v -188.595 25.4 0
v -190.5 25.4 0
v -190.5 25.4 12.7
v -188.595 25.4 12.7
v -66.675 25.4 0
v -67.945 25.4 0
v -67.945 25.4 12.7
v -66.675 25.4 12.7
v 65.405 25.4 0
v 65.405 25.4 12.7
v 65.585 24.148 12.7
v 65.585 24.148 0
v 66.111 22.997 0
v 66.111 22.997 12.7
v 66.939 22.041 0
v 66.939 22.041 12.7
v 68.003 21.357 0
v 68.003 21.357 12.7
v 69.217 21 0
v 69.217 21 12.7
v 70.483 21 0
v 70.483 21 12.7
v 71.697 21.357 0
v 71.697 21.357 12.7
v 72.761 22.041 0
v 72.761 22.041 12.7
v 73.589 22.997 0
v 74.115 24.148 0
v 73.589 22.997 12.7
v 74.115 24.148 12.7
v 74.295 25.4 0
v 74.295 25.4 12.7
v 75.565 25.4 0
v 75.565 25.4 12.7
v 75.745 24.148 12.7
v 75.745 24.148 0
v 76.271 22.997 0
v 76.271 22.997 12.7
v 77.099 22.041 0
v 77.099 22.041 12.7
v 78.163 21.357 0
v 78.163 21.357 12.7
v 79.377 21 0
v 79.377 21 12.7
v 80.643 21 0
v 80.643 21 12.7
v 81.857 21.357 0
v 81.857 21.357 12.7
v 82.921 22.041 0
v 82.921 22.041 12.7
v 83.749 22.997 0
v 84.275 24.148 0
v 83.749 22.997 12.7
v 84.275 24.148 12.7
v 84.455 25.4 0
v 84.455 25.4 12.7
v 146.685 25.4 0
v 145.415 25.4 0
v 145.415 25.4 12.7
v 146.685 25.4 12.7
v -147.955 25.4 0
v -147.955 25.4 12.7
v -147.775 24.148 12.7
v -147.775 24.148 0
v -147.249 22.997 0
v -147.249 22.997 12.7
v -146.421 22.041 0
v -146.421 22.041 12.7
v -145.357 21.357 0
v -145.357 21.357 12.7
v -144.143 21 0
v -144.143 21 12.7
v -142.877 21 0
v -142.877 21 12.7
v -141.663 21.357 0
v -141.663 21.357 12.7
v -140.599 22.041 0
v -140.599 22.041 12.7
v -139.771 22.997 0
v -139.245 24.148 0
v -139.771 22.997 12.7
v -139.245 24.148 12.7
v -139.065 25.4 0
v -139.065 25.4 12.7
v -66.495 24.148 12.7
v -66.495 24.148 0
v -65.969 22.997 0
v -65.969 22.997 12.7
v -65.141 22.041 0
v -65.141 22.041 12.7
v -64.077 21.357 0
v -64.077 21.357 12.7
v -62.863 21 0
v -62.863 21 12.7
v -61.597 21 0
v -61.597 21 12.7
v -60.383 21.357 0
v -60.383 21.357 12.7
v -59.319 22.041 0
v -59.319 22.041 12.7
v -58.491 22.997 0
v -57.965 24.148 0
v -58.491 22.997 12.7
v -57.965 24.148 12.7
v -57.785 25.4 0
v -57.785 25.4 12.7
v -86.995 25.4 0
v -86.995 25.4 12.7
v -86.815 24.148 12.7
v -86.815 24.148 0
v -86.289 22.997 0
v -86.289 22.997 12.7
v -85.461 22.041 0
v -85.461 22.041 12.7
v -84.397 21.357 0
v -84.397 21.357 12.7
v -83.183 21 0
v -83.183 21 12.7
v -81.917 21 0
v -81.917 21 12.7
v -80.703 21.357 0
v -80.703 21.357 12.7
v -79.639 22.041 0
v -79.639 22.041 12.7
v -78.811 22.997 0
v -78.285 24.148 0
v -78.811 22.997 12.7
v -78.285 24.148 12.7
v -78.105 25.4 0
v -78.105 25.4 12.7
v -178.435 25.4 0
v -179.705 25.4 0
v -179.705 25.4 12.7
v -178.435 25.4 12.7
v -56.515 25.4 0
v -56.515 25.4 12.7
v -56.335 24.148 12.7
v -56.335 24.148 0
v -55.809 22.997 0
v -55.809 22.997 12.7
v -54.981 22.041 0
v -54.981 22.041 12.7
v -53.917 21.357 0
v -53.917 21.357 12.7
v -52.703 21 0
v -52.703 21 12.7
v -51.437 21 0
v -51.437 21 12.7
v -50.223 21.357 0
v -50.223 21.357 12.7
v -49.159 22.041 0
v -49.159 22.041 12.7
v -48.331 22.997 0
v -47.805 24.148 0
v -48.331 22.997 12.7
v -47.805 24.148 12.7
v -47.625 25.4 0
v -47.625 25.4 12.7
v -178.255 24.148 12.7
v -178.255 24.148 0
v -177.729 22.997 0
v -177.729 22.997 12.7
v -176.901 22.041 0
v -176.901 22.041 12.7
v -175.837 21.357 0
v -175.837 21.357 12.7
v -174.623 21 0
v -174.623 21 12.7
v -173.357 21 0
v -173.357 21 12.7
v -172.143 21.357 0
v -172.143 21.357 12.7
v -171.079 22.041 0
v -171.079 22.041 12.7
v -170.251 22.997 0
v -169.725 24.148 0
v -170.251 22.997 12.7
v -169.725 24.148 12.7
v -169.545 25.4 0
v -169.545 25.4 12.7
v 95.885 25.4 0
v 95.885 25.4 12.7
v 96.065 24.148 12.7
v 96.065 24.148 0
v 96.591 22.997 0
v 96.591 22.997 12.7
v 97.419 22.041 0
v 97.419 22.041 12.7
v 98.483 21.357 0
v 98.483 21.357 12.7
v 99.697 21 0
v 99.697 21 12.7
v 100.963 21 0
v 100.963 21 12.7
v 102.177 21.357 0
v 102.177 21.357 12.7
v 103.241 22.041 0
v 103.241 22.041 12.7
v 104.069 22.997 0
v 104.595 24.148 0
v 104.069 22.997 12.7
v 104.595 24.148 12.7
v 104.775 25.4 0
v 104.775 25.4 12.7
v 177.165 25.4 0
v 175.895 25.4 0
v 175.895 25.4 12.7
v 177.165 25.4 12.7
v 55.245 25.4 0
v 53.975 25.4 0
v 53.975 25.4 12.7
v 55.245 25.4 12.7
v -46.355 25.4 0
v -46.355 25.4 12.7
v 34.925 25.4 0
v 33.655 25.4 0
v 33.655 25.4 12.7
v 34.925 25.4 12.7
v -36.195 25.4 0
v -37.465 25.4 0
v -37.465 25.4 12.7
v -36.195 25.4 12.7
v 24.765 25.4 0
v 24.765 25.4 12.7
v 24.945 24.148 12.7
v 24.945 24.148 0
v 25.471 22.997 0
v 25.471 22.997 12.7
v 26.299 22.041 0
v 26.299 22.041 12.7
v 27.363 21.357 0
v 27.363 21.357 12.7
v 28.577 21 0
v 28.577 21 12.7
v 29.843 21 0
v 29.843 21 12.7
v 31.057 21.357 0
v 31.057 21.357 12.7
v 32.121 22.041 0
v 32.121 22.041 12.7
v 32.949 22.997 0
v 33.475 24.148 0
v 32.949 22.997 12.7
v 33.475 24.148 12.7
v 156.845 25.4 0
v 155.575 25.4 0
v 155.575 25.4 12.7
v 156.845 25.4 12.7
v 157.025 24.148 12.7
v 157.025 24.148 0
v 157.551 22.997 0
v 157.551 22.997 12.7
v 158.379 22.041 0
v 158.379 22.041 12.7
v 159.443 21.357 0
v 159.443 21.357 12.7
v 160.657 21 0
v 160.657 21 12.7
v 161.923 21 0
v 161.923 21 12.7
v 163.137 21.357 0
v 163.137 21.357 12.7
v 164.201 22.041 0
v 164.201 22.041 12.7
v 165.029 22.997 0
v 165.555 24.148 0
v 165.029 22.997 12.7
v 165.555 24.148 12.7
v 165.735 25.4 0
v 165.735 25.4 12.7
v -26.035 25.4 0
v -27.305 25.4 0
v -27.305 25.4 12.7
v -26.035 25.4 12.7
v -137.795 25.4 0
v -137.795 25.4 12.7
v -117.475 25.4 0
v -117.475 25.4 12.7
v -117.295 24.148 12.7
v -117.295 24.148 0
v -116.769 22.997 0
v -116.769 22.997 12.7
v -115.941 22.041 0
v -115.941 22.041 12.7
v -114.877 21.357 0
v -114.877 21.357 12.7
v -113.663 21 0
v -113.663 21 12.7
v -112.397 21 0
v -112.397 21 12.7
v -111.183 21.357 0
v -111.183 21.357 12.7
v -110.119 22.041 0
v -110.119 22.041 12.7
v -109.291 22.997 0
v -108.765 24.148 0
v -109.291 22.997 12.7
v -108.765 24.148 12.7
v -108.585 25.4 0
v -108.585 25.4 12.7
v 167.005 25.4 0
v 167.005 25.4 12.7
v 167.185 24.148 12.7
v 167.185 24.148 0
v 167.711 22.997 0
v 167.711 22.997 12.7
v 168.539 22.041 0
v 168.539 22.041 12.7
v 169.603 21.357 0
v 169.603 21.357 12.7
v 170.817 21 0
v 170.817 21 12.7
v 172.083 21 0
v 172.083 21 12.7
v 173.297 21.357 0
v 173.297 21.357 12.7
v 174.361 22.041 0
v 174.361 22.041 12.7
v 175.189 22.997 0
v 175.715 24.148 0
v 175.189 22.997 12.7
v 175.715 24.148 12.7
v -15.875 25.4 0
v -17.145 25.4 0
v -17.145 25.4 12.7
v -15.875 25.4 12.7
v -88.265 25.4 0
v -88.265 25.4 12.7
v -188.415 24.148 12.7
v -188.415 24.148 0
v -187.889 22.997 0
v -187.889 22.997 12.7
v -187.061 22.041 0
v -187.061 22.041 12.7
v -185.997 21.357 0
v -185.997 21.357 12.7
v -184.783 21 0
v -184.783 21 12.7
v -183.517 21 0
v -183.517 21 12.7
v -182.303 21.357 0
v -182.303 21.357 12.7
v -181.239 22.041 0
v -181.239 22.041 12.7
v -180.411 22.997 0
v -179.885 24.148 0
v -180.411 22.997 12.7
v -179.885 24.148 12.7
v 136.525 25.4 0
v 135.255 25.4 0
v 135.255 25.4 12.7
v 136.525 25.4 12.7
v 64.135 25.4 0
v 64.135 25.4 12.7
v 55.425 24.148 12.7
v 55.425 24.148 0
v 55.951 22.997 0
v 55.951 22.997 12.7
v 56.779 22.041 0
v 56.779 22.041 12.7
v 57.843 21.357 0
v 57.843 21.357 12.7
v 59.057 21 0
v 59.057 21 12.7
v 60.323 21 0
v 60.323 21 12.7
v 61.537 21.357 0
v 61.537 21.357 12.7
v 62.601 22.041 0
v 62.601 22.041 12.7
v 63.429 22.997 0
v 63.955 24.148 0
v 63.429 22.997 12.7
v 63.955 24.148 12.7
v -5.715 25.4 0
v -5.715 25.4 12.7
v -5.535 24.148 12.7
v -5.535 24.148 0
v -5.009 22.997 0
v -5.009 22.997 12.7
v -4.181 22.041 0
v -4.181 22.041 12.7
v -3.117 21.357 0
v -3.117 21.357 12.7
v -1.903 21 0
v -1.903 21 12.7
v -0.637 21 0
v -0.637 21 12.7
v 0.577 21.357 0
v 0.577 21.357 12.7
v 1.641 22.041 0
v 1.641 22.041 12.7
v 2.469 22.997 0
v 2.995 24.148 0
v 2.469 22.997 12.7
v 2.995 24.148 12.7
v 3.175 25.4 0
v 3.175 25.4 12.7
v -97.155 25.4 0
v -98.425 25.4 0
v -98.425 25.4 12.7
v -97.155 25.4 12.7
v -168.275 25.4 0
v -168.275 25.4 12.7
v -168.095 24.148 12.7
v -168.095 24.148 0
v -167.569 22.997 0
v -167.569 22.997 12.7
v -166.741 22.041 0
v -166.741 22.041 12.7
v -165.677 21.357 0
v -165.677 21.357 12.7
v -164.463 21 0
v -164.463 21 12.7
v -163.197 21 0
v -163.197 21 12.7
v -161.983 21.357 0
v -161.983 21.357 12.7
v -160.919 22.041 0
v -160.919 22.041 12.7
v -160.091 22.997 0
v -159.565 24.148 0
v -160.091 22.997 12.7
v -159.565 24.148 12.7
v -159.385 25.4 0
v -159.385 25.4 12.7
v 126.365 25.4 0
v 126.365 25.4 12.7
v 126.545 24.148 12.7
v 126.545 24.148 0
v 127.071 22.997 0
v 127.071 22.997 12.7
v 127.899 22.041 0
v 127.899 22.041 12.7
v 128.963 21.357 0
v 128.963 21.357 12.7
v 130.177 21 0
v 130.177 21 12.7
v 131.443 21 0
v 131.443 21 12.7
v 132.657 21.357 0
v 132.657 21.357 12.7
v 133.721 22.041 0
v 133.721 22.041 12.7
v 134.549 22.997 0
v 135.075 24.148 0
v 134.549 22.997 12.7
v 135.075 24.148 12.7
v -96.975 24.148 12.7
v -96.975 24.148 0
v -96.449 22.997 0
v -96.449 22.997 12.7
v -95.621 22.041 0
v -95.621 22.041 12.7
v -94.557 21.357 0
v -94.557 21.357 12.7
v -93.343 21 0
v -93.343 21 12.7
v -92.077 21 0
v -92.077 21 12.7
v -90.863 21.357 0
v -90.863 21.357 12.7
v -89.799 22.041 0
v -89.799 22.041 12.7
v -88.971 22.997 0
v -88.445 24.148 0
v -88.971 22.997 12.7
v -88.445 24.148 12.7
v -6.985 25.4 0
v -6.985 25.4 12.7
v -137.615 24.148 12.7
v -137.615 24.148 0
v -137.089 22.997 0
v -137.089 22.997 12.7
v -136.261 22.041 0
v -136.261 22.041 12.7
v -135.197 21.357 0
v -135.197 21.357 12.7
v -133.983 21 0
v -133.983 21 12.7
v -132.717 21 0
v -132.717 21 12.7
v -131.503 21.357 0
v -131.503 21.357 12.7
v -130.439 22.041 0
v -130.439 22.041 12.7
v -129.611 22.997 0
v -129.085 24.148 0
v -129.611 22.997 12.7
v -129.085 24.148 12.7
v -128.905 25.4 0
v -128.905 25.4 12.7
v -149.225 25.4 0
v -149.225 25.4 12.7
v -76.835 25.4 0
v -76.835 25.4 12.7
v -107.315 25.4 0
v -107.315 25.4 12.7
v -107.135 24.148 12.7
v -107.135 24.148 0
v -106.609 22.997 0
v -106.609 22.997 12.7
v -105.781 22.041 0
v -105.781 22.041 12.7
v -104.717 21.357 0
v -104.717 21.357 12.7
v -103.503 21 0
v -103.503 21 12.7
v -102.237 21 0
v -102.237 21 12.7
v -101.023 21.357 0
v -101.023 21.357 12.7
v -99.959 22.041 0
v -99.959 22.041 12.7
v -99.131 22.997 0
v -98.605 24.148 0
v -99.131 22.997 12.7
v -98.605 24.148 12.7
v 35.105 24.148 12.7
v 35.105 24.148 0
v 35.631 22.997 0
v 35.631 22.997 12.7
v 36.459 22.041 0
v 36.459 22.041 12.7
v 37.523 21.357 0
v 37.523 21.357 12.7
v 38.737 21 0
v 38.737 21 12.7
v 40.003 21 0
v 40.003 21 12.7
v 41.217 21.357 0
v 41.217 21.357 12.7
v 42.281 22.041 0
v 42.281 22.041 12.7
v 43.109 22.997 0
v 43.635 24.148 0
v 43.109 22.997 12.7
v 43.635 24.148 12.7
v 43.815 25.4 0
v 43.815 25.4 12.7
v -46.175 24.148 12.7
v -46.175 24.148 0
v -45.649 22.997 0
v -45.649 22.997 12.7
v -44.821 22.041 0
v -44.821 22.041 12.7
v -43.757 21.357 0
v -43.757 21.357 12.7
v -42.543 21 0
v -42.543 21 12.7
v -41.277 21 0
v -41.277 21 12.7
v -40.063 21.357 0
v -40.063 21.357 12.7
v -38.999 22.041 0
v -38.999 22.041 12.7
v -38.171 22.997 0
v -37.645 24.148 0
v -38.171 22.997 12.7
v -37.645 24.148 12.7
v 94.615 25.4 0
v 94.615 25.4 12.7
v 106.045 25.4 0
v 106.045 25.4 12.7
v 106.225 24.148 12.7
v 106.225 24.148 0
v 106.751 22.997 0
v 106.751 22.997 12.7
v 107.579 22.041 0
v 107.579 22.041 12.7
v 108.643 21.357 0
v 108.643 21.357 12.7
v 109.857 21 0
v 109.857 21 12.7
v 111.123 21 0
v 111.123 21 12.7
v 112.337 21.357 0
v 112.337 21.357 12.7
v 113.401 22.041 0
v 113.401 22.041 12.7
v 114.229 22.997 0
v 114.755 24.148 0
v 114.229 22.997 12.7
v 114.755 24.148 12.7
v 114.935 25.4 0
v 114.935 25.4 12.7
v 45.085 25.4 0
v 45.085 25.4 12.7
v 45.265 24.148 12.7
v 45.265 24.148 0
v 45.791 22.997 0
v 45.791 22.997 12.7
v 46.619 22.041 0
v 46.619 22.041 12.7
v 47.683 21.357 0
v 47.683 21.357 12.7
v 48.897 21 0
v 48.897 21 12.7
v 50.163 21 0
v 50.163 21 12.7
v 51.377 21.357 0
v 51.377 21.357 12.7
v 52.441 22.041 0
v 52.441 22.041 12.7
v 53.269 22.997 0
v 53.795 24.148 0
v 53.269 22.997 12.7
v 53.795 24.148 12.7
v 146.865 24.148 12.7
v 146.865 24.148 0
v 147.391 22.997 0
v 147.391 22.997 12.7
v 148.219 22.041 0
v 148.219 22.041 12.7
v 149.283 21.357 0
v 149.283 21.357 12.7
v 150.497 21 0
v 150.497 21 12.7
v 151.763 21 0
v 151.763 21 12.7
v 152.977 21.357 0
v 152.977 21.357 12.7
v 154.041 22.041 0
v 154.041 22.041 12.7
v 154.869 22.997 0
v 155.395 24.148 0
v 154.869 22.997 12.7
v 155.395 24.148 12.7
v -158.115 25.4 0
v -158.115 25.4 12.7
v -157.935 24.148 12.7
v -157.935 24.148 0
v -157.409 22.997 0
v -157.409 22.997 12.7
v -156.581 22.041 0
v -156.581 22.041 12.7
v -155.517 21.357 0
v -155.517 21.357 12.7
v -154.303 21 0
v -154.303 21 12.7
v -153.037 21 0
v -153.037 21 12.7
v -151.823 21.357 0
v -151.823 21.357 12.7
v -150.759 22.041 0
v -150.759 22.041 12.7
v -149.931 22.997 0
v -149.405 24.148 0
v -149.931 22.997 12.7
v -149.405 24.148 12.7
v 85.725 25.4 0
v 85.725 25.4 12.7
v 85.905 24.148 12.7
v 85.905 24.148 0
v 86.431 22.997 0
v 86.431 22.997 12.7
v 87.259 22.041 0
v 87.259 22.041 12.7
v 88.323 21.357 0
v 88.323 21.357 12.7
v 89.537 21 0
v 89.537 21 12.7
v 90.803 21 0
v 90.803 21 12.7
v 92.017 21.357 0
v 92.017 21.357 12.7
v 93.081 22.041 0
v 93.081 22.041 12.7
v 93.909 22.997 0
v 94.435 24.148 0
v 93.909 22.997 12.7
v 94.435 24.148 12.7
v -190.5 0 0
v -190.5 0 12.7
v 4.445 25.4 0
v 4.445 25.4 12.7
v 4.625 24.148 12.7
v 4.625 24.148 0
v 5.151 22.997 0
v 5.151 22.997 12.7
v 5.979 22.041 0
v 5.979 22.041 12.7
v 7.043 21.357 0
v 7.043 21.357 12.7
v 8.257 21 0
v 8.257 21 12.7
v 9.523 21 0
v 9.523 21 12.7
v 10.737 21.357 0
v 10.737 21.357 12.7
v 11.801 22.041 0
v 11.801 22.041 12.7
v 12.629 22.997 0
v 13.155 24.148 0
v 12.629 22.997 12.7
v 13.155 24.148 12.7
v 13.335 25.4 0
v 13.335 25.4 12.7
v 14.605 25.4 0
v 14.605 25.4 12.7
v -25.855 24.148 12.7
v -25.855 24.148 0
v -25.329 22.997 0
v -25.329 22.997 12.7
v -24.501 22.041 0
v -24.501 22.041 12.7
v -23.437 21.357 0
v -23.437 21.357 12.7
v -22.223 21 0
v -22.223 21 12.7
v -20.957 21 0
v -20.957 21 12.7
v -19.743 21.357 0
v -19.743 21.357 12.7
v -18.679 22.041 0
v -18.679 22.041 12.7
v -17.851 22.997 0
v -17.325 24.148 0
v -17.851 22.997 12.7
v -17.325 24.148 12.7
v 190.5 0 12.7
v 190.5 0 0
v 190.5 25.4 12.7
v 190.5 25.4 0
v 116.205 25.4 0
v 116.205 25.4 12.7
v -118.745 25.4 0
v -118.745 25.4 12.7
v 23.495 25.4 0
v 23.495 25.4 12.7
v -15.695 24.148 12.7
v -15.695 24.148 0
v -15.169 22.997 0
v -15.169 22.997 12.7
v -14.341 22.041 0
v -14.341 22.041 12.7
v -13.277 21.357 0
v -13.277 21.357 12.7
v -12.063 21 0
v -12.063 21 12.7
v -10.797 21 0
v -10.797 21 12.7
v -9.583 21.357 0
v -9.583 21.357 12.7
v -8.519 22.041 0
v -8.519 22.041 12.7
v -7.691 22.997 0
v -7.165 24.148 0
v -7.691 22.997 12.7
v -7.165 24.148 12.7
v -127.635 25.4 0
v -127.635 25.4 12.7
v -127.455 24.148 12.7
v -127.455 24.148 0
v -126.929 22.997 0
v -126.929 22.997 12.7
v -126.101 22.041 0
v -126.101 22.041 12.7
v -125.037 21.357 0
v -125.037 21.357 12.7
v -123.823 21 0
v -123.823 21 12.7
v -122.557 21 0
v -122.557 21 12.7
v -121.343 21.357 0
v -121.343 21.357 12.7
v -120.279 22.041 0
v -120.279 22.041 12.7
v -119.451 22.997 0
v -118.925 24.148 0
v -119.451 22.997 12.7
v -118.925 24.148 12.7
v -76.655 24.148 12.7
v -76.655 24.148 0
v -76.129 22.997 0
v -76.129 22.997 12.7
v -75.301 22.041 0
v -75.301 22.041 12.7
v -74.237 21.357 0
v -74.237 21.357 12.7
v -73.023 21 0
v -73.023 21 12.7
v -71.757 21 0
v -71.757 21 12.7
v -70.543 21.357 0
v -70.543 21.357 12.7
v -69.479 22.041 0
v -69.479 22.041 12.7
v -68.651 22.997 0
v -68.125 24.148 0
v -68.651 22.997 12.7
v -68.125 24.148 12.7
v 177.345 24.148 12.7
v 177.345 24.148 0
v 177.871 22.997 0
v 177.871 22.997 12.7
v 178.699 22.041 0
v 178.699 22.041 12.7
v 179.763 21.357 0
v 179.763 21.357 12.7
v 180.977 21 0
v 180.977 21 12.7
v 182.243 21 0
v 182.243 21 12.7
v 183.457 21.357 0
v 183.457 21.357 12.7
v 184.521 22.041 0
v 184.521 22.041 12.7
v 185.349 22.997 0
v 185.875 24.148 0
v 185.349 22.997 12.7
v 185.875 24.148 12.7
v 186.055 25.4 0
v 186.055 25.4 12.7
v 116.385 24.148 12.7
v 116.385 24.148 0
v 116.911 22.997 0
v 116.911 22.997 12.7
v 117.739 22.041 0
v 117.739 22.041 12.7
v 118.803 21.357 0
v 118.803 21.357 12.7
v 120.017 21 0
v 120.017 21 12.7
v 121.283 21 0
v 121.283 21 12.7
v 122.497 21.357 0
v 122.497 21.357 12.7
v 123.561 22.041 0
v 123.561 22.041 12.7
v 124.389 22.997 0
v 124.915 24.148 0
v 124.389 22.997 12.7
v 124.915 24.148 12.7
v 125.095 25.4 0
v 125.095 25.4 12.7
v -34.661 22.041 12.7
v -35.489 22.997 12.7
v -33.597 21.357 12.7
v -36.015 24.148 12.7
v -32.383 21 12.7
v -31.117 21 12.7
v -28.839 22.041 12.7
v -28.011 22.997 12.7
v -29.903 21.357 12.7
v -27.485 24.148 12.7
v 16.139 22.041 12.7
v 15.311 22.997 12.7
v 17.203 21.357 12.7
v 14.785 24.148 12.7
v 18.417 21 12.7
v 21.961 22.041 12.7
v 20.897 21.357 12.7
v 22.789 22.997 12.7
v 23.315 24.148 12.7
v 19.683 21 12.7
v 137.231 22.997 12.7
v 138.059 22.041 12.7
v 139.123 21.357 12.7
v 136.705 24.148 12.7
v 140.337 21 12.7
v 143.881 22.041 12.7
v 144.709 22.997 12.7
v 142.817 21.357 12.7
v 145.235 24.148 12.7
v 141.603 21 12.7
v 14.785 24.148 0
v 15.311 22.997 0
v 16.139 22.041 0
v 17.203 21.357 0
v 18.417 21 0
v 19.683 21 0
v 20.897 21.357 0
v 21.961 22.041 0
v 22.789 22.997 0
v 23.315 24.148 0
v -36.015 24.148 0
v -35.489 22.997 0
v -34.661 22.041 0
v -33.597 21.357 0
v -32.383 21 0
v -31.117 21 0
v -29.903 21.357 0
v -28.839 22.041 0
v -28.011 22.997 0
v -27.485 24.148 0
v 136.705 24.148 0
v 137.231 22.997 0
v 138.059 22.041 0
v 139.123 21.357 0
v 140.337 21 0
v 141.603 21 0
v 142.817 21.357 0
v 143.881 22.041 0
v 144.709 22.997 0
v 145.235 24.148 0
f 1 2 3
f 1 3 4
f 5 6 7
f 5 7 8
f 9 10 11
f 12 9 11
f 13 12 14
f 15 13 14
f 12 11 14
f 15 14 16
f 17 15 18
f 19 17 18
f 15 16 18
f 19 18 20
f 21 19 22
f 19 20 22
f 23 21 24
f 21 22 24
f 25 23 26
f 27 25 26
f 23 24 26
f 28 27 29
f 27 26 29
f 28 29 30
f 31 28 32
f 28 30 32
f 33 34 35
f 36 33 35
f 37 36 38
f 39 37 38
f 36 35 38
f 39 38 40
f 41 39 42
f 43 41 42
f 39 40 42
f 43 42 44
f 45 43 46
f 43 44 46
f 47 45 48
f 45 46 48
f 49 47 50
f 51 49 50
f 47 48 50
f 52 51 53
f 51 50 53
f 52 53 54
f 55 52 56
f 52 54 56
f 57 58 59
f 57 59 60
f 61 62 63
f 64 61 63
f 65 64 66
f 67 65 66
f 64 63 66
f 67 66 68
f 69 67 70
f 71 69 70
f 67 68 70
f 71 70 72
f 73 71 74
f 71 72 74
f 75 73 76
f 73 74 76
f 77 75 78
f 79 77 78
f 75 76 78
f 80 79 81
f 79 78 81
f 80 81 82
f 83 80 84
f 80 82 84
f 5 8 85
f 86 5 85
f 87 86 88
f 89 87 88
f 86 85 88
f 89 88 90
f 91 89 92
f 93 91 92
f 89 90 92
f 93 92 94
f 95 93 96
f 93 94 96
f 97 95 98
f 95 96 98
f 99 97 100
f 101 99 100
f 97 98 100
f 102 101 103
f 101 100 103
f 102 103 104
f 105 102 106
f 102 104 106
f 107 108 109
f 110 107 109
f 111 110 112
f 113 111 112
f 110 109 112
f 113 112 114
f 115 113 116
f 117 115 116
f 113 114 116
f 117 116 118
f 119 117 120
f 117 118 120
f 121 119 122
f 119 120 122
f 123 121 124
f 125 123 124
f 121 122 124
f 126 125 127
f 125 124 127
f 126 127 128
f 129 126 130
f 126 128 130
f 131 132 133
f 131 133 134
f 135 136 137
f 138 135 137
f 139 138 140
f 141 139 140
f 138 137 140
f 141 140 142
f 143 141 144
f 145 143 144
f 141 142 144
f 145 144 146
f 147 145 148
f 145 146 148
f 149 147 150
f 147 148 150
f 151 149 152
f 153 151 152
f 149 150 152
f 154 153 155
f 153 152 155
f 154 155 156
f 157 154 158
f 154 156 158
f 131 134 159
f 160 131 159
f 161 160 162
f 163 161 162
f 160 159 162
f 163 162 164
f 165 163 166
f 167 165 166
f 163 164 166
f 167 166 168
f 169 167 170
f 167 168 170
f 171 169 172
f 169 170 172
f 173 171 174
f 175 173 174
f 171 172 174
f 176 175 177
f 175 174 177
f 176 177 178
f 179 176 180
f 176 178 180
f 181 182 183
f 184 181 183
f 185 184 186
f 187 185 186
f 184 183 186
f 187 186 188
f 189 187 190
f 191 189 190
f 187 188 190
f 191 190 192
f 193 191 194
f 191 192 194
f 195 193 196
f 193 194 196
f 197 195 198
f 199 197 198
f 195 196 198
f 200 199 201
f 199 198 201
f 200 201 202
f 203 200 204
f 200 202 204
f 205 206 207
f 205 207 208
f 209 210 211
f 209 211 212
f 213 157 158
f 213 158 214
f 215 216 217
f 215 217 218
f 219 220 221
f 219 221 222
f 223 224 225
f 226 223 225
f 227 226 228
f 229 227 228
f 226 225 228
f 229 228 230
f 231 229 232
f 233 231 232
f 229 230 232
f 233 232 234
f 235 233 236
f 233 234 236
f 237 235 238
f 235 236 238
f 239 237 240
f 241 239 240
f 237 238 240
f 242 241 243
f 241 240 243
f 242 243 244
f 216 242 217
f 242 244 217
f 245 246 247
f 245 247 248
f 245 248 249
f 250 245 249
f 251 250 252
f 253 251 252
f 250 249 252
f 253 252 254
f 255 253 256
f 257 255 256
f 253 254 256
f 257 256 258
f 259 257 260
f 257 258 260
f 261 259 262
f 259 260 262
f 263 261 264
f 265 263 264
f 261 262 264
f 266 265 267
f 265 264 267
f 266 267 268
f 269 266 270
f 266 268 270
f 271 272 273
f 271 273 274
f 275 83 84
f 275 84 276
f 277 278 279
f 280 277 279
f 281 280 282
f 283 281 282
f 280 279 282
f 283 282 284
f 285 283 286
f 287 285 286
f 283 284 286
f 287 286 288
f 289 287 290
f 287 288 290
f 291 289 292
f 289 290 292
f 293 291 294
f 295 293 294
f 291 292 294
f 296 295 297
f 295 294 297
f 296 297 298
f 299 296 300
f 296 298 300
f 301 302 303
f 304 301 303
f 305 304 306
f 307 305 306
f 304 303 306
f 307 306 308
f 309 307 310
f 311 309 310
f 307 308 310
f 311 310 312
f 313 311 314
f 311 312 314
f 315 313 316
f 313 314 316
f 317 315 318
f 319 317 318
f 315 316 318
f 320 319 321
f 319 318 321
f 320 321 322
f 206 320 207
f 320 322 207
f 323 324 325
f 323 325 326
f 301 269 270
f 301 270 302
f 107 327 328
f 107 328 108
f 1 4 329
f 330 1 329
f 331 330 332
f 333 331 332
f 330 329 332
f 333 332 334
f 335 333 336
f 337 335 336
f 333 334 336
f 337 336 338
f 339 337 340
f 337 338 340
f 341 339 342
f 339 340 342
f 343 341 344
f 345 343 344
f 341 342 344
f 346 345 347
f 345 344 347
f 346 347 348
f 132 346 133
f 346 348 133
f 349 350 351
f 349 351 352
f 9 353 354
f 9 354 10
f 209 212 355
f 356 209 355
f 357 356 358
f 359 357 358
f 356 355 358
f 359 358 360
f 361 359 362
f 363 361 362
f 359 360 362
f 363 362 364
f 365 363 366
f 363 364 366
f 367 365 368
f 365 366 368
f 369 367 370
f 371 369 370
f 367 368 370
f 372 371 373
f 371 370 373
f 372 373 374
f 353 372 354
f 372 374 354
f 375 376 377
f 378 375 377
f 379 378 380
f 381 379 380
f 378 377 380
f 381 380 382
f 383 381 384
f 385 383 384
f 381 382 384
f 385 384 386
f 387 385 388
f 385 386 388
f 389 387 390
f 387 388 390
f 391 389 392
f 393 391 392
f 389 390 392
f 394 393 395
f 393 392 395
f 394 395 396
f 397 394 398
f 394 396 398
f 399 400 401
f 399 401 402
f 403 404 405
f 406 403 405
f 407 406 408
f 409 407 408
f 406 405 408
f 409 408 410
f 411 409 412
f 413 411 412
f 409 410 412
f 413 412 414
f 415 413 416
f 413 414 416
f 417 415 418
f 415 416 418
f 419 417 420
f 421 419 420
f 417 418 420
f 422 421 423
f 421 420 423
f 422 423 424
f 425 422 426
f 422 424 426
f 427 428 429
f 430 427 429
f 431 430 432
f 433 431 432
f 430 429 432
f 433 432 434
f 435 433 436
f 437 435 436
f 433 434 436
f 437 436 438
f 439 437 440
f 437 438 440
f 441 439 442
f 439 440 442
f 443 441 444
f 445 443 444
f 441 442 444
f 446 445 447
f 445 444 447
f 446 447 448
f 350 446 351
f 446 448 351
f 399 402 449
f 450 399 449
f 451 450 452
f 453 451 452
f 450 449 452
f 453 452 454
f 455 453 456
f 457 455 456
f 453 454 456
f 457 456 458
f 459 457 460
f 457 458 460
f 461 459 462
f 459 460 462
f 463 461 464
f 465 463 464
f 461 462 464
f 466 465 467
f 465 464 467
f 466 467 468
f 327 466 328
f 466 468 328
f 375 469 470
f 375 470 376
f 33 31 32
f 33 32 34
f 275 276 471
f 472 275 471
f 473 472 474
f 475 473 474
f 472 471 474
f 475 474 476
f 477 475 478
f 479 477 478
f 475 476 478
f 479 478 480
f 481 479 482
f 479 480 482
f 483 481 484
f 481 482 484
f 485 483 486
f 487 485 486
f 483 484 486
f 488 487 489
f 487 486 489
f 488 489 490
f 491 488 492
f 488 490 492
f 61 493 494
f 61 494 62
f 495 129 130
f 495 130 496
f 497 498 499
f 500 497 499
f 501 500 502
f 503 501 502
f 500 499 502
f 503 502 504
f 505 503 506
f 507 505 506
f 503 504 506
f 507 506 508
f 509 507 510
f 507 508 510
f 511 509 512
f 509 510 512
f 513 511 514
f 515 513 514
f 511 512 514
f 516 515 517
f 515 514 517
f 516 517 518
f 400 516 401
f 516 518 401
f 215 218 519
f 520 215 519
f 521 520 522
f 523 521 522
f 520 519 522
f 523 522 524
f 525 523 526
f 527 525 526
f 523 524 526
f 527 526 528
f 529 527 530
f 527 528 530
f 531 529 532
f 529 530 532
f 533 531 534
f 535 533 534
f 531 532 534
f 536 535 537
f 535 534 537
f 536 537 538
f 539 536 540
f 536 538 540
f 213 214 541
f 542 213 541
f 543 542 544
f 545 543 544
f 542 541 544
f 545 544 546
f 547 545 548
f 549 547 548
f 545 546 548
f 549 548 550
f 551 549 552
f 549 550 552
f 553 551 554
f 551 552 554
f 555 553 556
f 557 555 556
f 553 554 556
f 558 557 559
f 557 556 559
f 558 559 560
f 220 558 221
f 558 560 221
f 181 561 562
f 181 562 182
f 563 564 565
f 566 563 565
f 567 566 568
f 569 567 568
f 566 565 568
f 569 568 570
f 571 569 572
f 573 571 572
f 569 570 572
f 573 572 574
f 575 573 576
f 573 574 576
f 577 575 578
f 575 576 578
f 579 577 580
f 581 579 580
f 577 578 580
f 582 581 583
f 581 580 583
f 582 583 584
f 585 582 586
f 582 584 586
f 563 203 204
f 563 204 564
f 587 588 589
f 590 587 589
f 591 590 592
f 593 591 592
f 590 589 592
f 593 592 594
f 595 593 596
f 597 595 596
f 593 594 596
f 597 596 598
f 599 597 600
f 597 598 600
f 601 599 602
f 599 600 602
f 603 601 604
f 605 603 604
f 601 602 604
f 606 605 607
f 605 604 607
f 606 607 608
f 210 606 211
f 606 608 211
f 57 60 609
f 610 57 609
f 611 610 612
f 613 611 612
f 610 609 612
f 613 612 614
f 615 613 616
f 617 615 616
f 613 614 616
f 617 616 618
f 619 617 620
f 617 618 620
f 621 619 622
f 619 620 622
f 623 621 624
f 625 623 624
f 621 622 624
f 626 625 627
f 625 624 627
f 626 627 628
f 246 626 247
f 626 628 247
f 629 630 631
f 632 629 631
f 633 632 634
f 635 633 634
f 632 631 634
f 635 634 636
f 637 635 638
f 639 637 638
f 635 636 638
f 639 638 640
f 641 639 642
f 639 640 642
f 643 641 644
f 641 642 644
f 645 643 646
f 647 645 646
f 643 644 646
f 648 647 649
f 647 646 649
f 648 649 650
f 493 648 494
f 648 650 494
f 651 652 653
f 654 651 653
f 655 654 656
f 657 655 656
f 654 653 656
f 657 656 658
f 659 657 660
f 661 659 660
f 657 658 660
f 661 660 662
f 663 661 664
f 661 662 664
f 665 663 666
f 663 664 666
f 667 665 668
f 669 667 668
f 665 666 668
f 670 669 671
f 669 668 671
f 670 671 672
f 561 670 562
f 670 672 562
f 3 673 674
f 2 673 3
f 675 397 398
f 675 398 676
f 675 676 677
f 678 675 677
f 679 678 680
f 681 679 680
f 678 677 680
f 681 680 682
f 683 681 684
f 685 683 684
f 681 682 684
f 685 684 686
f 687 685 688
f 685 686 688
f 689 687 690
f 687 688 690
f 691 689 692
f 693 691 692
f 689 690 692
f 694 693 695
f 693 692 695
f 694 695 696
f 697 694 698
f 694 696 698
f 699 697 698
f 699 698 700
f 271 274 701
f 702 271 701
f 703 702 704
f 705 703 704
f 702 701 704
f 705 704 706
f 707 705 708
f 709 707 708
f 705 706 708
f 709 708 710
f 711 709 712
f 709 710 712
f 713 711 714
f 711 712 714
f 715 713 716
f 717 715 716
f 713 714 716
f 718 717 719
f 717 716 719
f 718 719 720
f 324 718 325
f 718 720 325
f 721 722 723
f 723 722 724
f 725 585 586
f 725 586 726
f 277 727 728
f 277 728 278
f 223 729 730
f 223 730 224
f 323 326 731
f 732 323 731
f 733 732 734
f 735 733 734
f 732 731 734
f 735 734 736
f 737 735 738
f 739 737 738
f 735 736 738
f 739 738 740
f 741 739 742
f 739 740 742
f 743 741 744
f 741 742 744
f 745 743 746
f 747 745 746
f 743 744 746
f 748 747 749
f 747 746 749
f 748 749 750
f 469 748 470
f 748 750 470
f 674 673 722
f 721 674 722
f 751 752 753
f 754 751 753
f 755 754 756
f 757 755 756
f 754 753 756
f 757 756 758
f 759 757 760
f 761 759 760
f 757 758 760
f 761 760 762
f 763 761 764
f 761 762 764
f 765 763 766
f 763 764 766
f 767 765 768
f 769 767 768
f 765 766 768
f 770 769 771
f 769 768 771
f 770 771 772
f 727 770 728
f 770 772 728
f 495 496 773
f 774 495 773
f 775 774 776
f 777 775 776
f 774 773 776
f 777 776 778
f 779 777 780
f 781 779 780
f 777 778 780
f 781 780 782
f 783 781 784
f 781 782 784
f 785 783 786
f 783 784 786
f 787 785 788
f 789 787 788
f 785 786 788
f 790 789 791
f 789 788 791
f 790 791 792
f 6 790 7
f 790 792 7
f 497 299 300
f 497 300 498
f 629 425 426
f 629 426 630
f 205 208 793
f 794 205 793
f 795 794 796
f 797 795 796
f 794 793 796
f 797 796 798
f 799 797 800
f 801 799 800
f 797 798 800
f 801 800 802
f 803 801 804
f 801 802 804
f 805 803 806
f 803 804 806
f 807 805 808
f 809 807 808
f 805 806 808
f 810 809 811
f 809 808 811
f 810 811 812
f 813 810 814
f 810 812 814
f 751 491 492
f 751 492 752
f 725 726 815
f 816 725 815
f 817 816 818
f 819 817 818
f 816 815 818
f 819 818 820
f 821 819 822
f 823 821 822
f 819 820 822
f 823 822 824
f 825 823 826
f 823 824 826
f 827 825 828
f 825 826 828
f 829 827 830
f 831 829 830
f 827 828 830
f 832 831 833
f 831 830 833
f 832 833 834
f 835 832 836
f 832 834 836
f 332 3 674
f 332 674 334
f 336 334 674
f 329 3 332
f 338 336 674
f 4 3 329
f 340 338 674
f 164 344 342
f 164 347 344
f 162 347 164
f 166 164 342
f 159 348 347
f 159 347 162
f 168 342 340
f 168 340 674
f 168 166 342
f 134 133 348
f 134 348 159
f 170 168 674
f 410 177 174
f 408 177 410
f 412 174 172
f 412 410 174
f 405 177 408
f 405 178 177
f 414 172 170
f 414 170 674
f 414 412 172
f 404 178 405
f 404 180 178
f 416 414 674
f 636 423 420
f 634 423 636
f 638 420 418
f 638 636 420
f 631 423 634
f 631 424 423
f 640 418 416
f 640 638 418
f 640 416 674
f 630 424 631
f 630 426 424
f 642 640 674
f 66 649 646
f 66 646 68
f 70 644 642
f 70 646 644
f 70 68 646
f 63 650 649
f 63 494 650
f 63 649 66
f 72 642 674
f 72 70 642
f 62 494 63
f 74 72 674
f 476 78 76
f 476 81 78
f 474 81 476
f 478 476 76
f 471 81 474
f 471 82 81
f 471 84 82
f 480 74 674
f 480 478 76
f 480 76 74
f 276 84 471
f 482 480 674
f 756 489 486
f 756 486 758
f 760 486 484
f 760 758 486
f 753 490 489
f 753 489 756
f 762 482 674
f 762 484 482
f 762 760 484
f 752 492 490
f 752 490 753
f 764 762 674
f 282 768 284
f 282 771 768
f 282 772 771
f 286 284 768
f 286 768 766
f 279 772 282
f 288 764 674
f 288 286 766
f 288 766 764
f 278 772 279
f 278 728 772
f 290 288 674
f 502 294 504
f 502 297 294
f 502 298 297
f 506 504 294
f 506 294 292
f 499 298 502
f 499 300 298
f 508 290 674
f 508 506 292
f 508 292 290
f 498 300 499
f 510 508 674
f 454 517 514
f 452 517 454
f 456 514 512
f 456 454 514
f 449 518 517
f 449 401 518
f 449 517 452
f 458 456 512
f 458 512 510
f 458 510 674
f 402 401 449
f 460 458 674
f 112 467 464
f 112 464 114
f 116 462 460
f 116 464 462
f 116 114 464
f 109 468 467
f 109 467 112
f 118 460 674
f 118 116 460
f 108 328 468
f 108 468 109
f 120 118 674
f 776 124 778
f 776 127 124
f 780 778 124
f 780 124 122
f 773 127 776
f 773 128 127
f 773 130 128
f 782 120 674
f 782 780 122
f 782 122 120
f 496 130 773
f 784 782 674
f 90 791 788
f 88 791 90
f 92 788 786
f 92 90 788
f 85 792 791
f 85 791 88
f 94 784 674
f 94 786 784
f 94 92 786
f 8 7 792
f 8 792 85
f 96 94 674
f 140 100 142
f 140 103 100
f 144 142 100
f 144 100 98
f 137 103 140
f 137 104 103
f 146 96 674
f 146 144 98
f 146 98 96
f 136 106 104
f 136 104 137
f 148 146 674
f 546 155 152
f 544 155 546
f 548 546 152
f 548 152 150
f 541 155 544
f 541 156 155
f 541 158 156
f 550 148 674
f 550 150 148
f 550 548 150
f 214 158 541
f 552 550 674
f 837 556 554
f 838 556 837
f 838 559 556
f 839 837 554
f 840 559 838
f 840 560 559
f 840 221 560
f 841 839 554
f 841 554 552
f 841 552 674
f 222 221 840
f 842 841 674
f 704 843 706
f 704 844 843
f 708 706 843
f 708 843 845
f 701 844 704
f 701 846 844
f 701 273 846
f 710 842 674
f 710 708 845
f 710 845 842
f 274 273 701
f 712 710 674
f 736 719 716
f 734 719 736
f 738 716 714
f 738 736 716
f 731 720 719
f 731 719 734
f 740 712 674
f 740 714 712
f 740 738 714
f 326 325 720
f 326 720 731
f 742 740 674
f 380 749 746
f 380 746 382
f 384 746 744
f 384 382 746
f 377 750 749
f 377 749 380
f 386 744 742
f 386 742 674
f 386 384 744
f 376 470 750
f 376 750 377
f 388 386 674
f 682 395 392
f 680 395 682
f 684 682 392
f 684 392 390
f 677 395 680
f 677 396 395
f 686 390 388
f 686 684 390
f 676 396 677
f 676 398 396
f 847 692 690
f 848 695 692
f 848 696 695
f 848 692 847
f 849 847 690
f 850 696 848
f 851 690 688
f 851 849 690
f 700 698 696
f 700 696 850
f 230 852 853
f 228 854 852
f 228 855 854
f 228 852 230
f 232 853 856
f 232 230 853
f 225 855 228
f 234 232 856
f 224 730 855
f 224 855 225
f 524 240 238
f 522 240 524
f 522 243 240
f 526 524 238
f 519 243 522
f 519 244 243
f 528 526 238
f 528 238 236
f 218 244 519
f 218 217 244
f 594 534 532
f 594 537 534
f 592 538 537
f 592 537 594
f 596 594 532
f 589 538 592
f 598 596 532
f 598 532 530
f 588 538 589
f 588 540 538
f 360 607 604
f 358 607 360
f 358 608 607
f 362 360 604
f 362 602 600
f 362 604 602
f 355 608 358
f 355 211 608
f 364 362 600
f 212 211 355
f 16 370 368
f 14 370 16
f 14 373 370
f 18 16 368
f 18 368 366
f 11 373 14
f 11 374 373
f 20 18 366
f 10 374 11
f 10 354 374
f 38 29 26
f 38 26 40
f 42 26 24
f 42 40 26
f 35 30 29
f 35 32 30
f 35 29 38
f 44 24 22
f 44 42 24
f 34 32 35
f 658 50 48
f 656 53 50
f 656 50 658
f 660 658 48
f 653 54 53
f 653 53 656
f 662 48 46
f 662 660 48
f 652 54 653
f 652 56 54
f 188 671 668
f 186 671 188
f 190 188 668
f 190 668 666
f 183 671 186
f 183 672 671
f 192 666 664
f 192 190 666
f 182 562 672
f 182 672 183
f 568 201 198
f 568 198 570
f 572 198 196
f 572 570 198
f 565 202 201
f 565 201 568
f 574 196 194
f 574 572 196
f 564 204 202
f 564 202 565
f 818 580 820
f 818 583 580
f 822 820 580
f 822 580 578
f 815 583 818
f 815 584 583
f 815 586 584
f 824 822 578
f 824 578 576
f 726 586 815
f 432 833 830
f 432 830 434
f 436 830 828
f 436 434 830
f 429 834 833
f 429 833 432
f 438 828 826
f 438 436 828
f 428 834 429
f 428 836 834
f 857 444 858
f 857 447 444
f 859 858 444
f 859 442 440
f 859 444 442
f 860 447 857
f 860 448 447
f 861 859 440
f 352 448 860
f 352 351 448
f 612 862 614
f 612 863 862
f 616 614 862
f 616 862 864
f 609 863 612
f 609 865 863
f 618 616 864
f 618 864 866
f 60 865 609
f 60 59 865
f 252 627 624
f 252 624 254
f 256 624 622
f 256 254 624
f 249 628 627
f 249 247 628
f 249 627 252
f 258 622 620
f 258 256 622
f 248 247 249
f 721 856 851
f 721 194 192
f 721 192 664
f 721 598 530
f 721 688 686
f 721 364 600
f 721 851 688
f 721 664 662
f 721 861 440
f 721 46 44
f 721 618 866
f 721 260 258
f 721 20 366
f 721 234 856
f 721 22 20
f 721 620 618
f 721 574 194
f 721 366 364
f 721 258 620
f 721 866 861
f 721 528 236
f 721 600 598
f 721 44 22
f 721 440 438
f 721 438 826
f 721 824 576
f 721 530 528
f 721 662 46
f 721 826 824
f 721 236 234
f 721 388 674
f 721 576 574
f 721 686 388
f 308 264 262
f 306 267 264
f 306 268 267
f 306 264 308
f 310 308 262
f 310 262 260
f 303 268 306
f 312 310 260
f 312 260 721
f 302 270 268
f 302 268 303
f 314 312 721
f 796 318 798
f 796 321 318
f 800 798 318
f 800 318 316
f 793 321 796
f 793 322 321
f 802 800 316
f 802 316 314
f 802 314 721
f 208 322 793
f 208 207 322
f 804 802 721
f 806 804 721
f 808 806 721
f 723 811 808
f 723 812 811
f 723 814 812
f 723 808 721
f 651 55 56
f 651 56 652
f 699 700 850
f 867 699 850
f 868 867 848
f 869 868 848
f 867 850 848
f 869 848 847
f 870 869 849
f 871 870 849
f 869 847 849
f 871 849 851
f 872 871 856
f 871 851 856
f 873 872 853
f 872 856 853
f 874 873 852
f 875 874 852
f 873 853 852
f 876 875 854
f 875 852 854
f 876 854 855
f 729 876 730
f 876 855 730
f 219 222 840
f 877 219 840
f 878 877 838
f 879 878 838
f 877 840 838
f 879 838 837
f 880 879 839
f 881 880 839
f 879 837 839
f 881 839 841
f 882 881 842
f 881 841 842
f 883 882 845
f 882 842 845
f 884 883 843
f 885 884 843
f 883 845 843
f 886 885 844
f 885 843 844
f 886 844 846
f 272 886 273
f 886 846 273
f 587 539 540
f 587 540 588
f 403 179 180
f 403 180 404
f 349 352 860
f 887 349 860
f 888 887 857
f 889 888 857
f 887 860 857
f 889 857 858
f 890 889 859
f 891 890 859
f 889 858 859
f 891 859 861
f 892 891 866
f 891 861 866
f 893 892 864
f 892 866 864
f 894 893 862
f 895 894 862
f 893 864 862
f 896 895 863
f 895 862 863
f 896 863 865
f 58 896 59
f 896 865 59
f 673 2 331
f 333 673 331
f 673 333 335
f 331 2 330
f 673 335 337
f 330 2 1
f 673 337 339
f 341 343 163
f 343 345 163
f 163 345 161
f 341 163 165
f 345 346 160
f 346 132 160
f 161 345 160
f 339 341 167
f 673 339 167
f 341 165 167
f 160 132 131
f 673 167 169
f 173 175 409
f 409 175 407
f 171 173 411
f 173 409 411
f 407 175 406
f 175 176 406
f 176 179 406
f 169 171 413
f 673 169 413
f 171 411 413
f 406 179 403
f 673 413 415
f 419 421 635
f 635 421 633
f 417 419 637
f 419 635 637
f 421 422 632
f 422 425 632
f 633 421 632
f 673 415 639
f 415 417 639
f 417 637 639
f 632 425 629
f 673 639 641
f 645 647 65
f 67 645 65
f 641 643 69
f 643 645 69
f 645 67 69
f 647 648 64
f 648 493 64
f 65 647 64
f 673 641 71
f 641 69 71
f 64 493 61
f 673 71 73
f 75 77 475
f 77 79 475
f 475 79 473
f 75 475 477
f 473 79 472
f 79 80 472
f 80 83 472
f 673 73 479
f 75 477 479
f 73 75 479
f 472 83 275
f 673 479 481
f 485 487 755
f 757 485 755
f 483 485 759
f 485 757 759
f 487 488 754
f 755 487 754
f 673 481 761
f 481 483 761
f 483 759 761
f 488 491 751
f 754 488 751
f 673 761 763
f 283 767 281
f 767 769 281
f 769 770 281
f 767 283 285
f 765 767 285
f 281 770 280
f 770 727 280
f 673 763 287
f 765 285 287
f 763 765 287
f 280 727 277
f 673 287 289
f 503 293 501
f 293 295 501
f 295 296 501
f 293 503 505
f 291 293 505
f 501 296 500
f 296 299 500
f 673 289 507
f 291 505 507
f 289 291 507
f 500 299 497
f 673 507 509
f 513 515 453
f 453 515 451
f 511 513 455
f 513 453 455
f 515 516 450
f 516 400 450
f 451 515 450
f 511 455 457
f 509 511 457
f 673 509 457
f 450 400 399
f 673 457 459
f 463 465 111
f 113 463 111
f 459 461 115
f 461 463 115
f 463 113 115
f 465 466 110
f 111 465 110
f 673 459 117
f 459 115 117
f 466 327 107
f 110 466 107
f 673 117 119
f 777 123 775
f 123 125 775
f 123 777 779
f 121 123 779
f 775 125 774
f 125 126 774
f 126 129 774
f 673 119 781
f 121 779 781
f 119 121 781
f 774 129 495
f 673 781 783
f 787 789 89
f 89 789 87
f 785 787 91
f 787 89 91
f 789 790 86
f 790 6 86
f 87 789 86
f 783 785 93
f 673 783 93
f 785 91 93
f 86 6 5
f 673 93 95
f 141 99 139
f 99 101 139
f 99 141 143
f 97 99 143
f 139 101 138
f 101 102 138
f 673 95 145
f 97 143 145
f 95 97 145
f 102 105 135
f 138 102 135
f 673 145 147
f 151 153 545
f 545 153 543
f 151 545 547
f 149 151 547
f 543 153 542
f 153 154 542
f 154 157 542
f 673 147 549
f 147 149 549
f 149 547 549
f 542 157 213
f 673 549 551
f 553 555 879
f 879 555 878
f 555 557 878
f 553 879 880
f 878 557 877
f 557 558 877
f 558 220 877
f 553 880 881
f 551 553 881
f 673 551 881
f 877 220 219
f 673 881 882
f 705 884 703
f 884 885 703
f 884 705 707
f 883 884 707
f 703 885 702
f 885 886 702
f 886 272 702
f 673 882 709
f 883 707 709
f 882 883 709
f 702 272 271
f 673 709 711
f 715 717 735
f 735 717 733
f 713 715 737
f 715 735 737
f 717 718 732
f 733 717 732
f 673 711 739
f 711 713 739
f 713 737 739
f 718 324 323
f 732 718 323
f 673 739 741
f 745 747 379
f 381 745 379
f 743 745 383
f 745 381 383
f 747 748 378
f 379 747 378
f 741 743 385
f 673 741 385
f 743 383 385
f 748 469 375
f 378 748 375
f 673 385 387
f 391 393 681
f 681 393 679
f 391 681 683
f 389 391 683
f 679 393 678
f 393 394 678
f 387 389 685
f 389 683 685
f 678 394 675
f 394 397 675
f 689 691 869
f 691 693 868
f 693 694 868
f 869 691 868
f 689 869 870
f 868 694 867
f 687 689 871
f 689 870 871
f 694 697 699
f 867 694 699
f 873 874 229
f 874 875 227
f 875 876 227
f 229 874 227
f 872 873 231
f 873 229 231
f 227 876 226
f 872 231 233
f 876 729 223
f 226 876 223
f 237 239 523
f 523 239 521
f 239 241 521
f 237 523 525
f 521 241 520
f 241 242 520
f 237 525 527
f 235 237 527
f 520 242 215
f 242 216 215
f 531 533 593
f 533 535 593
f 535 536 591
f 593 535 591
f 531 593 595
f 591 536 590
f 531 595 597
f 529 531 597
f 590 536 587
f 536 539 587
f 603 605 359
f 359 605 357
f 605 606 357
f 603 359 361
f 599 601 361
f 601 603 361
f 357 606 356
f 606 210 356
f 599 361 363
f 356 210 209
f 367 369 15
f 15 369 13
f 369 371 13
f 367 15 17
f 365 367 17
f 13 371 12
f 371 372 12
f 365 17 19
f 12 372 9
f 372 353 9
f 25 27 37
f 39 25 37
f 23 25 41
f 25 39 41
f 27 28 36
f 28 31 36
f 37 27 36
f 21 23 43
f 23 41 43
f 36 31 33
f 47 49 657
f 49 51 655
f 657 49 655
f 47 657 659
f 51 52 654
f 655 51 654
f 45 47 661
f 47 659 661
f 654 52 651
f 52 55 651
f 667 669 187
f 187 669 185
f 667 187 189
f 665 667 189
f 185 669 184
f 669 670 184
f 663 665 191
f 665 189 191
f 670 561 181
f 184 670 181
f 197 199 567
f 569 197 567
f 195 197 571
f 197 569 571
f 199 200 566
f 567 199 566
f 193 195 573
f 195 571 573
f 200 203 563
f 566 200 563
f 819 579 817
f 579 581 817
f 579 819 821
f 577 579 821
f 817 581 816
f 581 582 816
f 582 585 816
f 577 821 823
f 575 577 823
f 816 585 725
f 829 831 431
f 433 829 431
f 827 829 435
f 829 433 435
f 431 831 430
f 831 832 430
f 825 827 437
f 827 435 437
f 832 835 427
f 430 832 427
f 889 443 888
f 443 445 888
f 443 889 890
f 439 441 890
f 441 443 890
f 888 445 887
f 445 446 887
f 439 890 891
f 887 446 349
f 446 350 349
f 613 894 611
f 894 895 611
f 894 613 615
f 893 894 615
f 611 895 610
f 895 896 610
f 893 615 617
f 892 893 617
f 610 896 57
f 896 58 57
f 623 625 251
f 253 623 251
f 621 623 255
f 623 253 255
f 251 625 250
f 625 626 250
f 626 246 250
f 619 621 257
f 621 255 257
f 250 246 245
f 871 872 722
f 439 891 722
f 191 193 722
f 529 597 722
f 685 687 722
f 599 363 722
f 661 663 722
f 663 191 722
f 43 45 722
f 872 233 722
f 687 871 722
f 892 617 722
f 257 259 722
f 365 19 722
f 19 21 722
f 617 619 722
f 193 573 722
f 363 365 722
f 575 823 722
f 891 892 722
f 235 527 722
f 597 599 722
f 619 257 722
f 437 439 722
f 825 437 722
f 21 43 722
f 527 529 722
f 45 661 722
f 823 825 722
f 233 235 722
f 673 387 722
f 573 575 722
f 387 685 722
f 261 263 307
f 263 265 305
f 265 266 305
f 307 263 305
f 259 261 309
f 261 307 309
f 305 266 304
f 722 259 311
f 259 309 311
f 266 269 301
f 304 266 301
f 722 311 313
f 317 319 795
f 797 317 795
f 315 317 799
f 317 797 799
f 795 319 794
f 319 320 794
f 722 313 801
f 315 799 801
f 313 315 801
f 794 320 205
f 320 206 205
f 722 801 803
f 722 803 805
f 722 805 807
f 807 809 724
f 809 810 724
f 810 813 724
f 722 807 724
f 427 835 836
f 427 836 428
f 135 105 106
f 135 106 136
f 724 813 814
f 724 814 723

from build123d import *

# Parameters (mm, degrees)
SKETCH1_W           = 381
SKETCH1_H           = 25.4
BOSS_EXTRUDE1_DEPTH = 12.7
CUT_EXTRUDE1_REACH  = 194.605
SKETCH2_R           = 4.445
LPATTERN1_COUNT     = 37
LPATTERN1_PITCH     = 10.16


with BuildPart() as part:
    # Sketch1 → Boss-Extrude1 (new body)
    with BuildSketch(Plane.XY):
        with Locations((0, 12.7)):
            Rectangle(SKETCH1_W, SKETCH1_H)
    extrude(amount=BOSS_EXTRUDE1_DEPTH)

    # Sketch2 → Cut-Extrude1 (cut, up to next)
    with BuildSketch(Plane.XY.offset(12.7), mode=Mode.PRIVATE) as cut_extrude1_sk1:
        with Locations((-184.15, 25.4)):
            Circle(SKETCH2_R)
    cut_extrude1_tool1 = extrude(cut_extrude1_sk1.sketch, amount=-CUT_EXTRUDE1_REACH, mode=Mode.PRIVATE) & part.part
    cut_extrude1 = cut_extrude1_tool1.solids().sort_by_distance((-184.15, 25.4, 12.7))[0]
    add(cut_extrude1, mode=Mode.SUBTRACT)

    # LPattern1: Cut-Extrude1 ×37
    with Locations(*[(i * LPATTERN1_PITCH, 0, 0) for i in range(1, LPATTERN1_COUNT)]):
        add(cut_extrude1, mode=Mode.SUBTRACT)


solid = part.part
